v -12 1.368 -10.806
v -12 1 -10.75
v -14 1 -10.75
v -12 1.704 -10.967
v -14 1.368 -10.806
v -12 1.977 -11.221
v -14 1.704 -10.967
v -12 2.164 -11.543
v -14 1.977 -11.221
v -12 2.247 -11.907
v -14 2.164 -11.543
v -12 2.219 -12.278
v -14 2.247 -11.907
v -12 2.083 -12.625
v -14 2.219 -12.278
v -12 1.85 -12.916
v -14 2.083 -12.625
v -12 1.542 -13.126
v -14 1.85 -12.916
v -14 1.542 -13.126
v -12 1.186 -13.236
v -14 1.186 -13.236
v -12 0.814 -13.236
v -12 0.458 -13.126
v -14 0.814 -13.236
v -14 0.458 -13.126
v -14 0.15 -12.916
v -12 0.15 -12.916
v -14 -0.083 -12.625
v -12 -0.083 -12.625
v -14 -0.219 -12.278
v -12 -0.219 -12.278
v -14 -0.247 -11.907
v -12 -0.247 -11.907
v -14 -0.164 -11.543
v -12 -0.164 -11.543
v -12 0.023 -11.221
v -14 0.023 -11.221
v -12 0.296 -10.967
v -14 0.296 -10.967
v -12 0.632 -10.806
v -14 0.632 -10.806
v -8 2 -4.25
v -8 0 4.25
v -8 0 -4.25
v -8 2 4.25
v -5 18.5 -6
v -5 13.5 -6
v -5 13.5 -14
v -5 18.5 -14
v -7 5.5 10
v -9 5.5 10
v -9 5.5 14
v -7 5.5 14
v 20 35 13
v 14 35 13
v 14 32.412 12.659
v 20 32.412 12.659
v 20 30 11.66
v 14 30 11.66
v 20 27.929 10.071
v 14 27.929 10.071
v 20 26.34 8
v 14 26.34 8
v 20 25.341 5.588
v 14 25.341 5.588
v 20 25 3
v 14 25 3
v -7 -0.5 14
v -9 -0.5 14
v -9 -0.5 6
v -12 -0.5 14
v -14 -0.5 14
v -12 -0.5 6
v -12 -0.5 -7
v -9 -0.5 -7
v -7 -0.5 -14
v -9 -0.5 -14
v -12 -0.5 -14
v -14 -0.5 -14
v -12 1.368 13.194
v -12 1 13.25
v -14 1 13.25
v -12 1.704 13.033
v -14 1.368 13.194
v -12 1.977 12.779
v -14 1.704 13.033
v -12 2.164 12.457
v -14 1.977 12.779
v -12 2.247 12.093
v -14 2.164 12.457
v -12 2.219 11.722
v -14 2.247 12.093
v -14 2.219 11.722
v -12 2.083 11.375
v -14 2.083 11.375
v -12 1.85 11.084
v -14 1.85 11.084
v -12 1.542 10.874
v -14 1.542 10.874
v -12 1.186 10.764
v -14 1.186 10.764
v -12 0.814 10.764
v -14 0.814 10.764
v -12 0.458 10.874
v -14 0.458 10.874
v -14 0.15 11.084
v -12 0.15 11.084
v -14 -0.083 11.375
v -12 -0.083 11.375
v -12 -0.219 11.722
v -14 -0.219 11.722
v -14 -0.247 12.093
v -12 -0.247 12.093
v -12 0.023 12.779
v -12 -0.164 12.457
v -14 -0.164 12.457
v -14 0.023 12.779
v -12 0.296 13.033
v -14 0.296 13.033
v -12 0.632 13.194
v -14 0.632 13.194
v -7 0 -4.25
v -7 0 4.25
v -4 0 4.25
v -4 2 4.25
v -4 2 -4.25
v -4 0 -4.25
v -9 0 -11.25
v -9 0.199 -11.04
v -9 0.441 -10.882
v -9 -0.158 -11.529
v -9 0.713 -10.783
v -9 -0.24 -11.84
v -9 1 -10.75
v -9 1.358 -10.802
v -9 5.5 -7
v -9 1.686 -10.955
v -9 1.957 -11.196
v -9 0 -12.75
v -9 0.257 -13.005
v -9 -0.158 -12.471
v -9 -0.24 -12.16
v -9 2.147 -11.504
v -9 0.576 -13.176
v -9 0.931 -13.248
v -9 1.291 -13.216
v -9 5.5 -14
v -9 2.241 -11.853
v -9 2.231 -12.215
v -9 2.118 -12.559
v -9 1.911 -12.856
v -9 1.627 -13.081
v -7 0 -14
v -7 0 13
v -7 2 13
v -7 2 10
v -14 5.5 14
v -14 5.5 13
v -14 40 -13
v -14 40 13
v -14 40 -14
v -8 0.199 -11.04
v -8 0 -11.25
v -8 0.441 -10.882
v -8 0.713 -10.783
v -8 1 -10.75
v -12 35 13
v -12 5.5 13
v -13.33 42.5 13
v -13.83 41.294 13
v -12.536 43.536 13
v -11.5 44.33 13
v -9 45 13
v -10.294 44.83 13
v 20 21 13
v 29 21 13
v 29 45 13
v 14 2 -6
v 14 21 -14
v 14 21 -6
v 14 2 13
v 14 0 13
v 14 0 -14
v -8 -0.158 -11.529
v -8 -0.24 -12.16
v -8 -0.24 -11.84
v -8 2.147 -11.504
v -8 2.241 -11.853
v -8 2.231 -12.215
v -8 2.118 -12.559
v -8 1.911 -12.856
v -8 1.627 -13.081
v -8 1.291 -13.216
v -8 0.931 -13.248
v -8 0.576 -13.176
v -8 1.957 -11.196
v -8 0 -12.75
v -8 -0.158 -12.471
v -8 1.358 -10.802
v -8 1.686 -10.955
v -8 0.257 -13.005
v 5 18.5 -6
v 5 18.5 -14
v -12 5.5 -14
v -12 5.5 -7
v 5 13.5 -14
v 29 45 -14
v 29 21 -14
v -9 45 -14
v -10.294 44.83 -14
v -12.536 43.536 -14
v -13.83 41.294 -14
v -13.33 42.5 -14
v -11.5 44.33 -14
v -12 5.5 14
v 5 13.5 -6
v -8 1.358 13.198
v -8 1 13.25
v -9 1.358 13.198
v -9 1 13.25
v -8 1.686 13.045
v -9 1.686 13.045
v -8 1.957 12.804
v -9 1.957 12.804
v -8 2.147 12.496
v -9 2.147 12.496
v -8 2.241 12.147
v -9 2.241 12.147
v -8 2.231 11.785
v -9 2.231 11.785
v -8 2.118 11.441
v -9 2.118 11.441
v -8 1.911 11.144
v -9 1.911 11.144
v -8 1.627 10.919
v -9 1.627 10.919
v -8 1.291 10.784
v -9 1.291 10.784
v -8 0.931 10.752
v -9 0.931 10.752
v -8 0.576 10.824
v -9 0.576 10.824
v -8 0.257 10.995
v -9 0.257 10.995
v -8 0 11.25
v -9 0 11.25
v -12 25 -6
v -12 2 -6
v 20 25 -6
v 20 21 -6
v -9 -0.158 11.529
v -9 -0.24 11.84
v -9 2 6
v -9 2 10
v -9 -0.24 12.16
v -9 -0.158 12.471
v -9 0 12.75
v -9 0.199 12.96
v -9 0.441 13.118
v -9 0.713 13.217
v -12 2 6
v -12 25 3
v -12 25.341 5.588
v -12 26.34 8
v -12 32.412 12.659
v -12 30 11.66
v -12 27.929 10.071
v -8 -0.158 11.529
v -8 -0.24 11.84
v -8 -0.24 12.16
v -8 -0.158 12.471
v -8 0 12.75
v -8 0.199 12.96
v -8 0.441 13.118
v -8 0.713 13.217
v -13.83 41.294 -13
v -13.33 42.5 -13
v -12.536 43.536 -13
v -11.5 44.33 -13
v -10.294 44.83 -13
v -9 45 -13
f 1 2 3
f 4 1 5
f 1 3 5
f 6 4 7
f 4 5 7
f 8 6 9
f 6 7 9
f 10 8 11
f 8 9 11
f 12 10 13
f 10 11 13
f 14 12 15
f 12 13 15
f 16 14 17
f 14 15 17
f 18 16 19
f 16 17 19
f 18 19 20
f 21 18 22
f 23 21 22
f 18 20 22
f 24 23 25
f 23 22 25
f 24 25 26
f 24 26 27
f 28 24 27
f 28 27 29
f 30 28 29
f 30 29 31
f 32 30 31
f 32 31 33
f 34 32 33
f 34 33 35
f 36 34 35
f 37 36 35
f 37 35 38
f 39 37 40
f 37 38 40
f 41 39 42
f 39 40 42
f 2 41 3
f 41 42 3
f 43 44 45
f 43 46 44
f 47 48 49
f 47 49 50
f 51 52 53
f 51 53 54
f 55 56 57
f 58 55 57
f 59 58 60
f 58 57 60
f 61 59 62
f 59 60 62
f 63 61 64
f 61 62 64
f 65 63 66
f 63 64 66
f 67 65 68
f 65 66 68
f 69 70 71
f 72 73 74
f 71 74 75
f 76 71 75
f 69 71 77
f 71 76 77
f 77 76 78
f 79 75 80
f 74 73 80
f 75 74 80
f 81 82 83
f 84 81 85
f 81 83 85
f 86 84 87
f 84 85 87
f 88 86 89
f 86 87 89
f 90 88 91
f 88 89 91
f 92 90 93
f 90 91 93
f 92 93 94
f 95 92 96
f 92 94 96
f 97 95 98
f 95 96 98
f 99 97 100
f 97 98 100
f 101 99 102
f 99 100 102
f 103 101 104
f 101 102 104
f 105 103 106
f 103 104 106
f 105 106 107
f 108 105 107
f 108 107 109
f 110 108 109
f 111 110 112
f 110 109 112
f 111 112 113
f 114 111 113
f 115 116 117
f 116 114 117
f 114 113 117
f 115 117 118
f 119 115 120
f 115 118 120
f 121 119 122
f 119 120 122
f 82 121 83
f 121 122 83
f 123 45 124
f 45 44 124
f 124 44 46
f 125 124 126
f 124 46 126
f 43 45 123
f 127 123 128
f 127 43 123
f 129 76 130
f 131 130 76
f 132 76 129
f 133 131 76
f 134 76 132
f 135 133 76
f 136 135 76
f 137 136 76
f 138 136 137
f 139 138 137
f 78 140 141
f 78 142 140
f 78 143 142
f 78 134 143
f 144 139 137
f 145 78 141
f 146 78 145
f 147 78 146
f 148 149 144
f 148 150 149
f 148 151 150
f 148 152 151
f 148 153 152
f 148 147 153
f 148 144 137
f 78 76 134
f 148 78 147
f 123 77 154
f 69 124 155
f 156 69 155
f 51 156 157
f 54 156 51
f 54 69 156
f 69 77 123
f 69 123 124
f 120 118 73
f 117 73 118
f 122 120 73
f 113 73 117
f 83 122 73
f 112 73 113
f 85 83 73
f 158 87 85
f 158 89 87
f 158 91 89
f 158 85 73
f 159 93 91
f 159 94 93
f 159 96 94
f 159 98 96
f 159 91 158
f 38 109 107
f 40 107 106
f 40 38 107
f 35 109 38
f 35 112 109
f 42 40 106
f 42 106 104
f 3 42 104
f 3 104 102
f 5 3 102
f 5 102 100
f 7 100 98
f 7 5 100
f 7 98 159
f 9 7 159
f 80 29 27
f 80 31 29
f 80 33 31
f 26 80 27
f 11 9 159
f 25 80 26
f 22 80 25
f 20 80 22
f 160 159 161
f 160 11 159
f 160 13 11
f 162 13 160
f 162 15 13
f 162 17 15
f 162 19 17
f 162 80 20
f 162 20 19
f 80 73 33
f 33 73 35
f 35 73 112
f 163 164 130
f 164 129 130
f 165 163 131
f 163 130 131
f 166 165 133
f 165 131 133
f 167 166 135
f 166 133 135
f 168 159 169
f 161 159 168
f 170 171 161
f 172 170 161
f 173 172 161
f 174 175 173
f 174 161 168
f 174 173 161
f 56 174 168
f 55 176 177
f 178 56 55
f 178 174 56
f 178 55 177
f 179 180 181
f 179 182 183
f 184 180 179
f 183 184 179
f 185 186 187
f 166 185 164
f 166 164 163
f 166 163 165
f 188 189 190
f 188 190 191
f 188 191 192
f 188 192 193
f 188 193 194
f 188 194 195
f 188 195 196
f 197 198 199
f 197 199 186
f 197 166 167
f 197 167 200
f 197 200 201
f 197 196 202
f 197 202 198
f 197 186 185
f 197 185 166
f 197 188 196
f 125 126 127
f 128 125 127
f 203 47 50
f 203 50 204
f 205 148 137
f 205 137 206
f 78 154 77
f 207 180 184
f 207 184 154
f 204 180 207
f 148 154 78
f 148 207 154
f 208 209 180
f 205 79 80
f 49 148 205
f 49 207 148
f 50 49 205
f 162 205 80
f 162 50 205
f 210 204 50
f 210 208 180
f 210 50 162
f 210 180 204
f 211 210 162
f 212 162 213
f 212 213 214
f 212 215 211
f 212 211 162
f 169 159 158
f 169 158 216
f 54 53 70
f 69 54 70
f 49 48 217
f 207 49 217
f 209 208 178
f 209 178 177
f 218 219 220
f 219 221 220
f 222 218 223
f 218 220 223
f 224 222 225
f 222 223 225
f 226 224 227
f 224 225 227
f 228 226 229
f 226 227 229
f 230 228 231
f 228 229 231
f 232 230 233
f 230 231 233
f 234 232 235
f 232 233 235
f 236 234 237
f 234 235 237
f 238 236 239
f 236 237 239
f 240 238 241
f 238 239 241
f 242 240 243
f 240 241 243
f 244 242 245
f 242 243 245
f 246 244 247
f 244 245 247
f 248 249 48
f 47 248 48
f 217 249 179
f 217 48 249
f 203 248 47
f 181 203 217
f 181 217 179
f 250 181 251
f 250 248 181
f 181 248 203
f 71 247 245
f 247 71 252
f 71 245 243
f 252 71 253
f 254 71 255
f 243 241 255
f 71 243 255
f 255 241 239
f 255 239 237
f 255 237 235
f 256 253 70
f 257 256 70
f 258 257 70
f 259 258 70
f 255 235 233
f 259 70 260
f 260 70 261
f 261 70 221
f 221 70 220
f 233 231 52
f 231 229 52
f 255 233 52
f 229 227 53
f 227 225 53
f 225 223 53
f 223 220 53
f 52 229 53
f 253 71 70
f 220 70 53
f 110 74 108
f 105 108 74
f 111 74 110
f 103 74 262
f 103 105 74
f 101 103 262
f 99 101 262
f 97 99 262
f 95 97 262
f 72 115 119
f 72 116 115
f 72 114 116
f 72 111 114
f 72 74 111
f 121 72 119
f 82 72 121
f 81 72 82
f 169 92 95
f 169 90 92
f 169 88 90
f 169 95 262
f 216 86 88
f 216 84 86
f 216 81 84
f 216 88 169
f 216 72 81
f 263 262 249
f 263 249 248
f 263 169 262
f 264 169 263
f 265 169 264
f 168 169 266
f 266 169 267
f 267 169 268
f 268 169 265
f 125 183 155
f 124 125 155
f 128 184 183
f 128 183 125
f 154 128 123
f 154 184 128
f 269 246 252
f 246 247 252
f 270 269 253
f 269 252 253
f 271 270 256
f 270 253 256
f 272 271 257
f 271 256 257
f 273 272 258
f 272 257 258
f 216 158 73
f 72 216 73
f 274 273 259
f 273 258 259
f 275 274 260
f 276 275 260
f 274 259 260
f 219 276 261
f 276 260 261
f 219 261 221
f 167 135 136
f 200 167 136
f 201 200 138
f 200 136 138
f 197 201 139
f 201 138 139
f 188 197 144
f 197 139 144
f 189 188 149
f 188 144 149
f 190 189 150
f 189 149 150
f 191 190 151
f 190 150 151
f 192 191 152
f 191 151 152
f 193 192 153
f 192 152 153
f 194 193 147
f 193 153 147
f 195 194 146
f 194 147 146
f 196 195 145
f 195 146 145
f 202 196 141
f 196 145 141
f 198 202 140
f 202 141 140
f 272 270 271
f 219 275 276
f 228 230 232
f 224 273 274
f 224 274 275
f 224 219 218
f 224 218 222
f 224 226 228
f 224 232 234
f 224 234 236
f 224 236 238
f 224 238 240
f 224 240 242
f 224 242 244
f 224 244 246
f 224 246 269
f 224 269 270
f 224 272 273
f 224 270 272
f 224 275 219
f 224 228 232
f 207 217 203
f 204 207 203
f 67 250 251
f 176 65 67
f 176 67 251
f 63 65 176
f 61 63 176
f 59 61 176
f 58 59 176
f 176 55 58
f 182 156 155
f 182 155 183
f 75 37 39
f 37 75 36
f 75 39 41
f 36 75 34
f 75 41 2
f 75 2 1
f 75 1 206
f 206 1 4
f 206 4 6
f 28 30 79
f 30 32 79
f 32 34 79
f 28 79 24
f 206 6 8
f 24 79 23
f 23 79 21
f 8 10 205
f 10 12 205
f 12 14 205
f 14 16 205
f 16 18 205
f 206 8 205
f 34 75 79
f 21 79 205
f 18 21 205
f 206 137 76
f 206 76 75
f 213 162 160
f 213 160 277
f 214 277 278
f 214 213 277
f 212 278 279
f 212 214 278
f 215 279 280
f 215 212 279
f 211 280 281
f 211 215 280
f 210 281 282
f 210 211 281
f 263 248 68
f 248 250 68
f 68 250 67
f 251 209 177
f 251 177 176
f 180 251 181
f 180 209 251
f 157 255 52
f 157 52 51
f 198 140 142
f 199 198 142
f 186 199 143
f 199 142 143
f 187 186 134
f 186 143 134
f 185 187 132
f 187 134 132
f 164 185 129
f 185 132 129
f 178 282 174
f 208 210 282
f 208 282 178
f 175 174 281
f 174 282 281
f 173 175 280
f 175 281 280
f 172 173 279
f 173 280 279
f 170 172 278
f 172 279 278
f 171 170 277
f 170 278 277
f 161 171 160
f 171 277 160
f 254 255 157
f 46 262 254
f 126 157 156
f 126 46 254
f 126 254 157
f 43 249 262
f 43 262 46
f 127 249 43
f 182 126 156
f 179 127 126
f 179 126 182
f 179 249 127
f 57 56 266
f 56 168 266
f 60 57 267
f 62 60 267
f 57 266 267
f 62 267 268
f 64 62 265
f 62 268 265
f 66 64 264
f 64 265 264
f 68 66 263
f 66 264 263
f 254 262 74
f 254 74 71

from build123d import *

# Parameters (mm, degrees)
SKETCH1_W            = 28
SKETCH1_H            = 22
BOSS_EXTRUDE1_DEPTH  = 32
SKETCH21_W           = 26
SKETCH21_H           = 23
CUT_EXTRUDE10_DEPTH  = 17
SKETCH22_W           = 4
SKETCH22_H           = 8.5
CUT_EXTRUDE11_DEPTH  = 35.885527085
SKETCH23_W           = 10
SKETCH23_H           = 5
CUT_EXTRUDE12_DEPTH  = 5
SKETCH24_W           = 26
SKETCH24_H           = 24
BOSS_EXTRUDE4_DEPTH  = 15
BOSS_EXTRUDE5_DEPTH  = 28
SKETCH26_W           = 28
SKETCH26_H           = 21
SKETCH26_W_2         = 10
SKETCH26_H_2         = 5
BOSS_EXTRUDE6_DEPTH  = 2
BOSS_EXTRUDE7_DEPTH  = 2
FILLET1_R            = 5
FILLET2_R            = 10
SKETCH31_W           = 2
SKETCH31_H           = 26
BOSS_EXTRUDE8_DEPTH  = 0.5
BOSS_EXTRUDE12_DEPTH = 1
SKETCH41_W           = 2
SKETCH41_H           = 4
BOSS_EXTRUDE15_DEPTH = 3.5
SKETCH44_W           = 7
SKETCH44_H           = 6
BOSS_EXTRUDE17_DEPTH = 1
SKETCH30_R           = 1.25
CUT_EXTRUDE13_DEPTH  = 6
BOSS_EXTRUDE9_DEPTH  = 4
SKETCH37_W           = 1
SKETCH37_H           = 27
BOSS_EXTRUDE13_DEPTH = 0.5
SKETCH38_W           = 3
SKETCH38_H           = 2.5
CUT_EXTRUDE15_DEPTH  = 8
CUT_EXTRUDE16_DEPTH  = 6
SKETCH45_W           = 3
SKETCH45_H           = 6
CUT_EXTRUDE18_DEPTH  = 7
BOSS_EXTRUDE18_START = 1
BOSS_EXTRUDE18_DEPTH = 1
SKETCH48_W           = 10
SKETCH48_H           = 5
CUT_EXTRUDE19_DEPTH  = 60.958318856


with BuildPart() as part:
    # Sketch1 → Boss-Extrude1 (new body)
    with BuildSketch(Plane(origin=(0, 0, 0), x_dir=(1, 0, 0), z_dir=(0, 1, 0))):
        Rectangle(SKETCH1_W, SKETCH1_H)
    extrude(amount=BOSS_EXTRUDE1_DEPTH)

    # Sketch21 → Cut-Extrude10 (cut)
    with BuildSketch(Plane.XY.offset(11)):
        with Locations((1, 13.5)):
            Rectangle(SKETCH21_W, SKETCH21_H)
    extrude(amount=-CUT_EXTRUDE10_DEPTH, mode=Mode.SUBTRACT)

    # Sketch22 → Cut-Extrude11 (cut, through all)
    with BuildSketch(Plane(origin=(0, 2, 0), x_dir=(1, 0, 0), z_dir=(0, 1, 0))):
        with Locations((-6, 0)):
            Rectangle(SKETCH22_W, SKETCH22_H)
    extrude(amount=-CUT_EXTRUDE11_DEPTH, mode=Mode.SUBTRACT)

    # Sketch23 → Cut-Extrude12 (cut)
    with BuildSketch(Plane(origin=(0, 0, -11), x_dir=(-1, 0, 0), z_dir=(0, 0, -1))):
        with Locations((0, 16)):
            Rectangle(SKETCH23_W, SKETCH23_H)
    extrude(amount=-CUT_EXTRUDE12_DEPTH, mode=Mode.SUBTRACT)

    # Sketch24 → Boss-Extrude4 (add)
    with BuildSketch(Plane(origin=(14, 0, 0), x_dir=(0, 0, -1), z_dir=(1, 0, 0))):
        with Locations((0, 33)):
            Rectangle(SKETCH24_W, SKETCH24_H)
    extrude(amount=BOSS_EXTRUDE4_DEPTH)

    # Sketch25 → Boss-Extrude5 (add)
    with BuildSketch(Plane.ZY.offset(-14)):
        Polygon((11, 32), (11, 25), (13, 25), (13, 45), (-13, 45), (-13, 21), (-11, 21), (-11, 32), align=None)
    extrude(amount=BOSS_EXTRUDE5_DEPTH)

    # Sketch26 → Boss-Extrude6 (add)
    with BuildSketch(Plane(origin=(0, 0, -11), x_dir=(-1, 0, 0), z_dir=(0, 0, -1))):
        with Locations((0, 10.5)):
            Rectangle(SKETCH26_W, SKETCH26_H)
        with Locations((0, 16)):
            Rectangle(SKETCH26_W_2, SKETCH26_H_2, mode=Mode.SUBTRACT)
    extrude(amount=BOSS_EXTRUDE6_DEPTH)

    # Sketch27 → Boss-Extrude7 (add)
    with BuildSketch(Plane.XY.offset(11)):
        Polygon((14, 0), (-14, 0), (-14, 2), (-14, 25), (-12, 25), (-12, 2), (14, 2), align=None)
    extrude(amount=BOSS_EXTRUDE7_DEPTH)

    # Fillet1
    fillet1_edges = [part.edges().sort_by_distance(p)[0] for p in [
        (-14, 45, 0),
    ]]
    fillet(fillet1_edges, radius=FILLET1_R)

    # Fillet2
    fillet2_edges = [part.edges().sort_by_distance(p)[0] for p in [
        (1, 25, 13),
    ]]
    fillet(fillet2_edges, radius=FILLET2_R)

    # Sketch31 → Boss-Extrude8 (add)
    with BuildSketch(Plane.XZ):
        with Locations((-13, 0)):
            Rectangle(SKETCH31_W, SKETCH31_H)
    extrude(amount=BOSS_EXTRUDE8_DEPTH)

    # Sketch36 → Boss-Extrude12 (add)
    with BuildSketch(Plane.XY.offset(13)):
        Polygon((-12, 2), (-7, 2), (-7, 0), (-12, 0), (-12, -0.5), (-14, -0.5), (-14, 5.5), (-12, 5.5), align=None)
    extrude(amount=BOSS_EXTRUDE12_DEPTH)

    # Sketch41 → Boss-Extrude15 (add)
    with BuildSketch(Plane(origin=(0, 2, 0), x_dir=(1, 0, 0), z_dir=(0, 1, 0))):
        with Locations((-8, -12)):
            Rectangle(SKETCH41_W, SKETCH41_H)
    extrude(amount=BOSS_EXTRUDE15_DEPTH)

    # Sketch44 → Boss-Extrude17 (add)
    with BuildSketch(Plane(origin=(0, 0, -13), x_dir=(-1, 0, 0), z_dir=(0, 0, -1))):
        with Locations((10.5, 2.5)):
            Rectangle(SKETCH44_W, SKETCH44_H)
    extrude(amount=BOSS_EXTRUDE17_DEPTH)

    # Sketch30 → Cut-Extrude13 (cut)
    with BuildSketch(Plane.ZY.offset(14)):
        with Locations((-12, 1)):
            Circle(SKETCH30_R)
        with Locations((12, 1)):
            Circle(SKETCH30_R)
    extrude(amount=-CUT_EXTRUDE13_DEPTH, mode=Mode.SUBTRACT)

    # Sketch32 → Boss-Extrude9 (add)
    with BuildSketch(Plane(origin=(-12, 0, 0), x_dir=(0, 0, -1), z_dir=(1, 0, 0))):
        with BuildLine():
            Line((13, 0), (12.75, 0))
            ThreePointArc((12.75, 0), (12, -0.25), (11.25, 0))
            Line((11.25, 0), (-11.25, 0))
            ThreePointArc((-11.25, 0), (-12, -0.25), (-12.75, 0))
            Line((-12.75, 0), (-14, 0))
            Line((-14, 0), (-14, -0.5))
            Line((-14, -0.5), (13, -0.5))
            Line((13, -0.5), (13, 0))
        make_face()
    extrude(amount=BOSS_EXTRUDE9_DEPTH)

    # Sketch37 → Boss-Extrude13 (add)
    with BuildSketch(Plane.XZ):
        with Locations((-7.5, 0.5)):
            Rectangle(SKETCH37_W, SKETCH37_H)
    extrude(amount=BOSS_EXTRUDE13_DEPTH)

    # Sketch38 → Cut-Extrude15 (cut)
    with BuildSketch(Plane.XY.offset(14)):
        with Locations((-10.5, 0.75)):
            Rectangle(SKETCH38_W, SKETCH38_H)
    extrude(amount=-CUT_EXTRUDE15_DEPTH, mode=Mode.SUBTRACT)

    # Sketch39 → Cut-Extrude16 (cut)
    with BuildSketch(Plane.ZY.offset(-14)):
        with BuildLine():
            Line((13, 21), (13, 35))
            ThreePointArc((13, 35), (10.071067812, 27.928932188), (3, 25))
            Line((3, 25), (-6, 25))
            Line((-6, 25), (-6, 21))
            Line((-6, 21), (13, 21))
        make_face()
    extrude(amount=-CUT_EXTRUDE16_DEPTH, mode=Mode.SUBTRACT)

    # Sketch45 → Cut-Extrude18 (cut)
    with BuildSketch(Plane(origin=(0, 0, -14), x_dir=(-1, 0, 0), z_dir=(0, 0, -1))):
        with Locations((10.5, 2.5)):
            Rectangle(SKETCH45_W, SKETCH45_H)
    extrude(amount=-CUT_EXTRUDE18_DEPTH, mode=Mode.SUBTRACT)

    # Sketch46 → Boss-Extrude18 (add)
    with BuildSketch(Plane(origin=(0, 0, -13), x_dir=(-1, 0, 0), z_dir=(0, 0, -1)).offset(BOSS_EXTRUDE18_START)):
        with BuildLine():
            Line((7, 0), (7, 5.5))
            Line((7, 5.5), (9, 5.5))
            Line((9, 5.5), (12, 5.5))
            Line((12, 5.5), (14, 5.5))
            Line((14, 5.5), (14, 40))
            ThreePointArc((14, 40), (12.535533906, 43.535533906), (9, 45))
            Line((9, 45), (-29, 45))
            Line((-29, 45), (-29, 21))
            Line((-29, 21), (-14, 21))
            Line((-14, 21), (-14, 0))
            Line((-14, 0), (7, 0))
        make_face()
    extrude(amount=-BOSS_EXTRUDE18_DEPTH)

    # Sketch48 → Cut-Extrude19 (cut, through all)
    with BuildSketch(Plane.XY.offset(-13)):
        with Locations((0, 16)):
            Rectangle(SKETCH48_W, SKETCH48_H)
    extrude(amount=-CUT_EXTRUDE19_DEPTH, mode=Mode.SUBTRACT)


solid = part.part
